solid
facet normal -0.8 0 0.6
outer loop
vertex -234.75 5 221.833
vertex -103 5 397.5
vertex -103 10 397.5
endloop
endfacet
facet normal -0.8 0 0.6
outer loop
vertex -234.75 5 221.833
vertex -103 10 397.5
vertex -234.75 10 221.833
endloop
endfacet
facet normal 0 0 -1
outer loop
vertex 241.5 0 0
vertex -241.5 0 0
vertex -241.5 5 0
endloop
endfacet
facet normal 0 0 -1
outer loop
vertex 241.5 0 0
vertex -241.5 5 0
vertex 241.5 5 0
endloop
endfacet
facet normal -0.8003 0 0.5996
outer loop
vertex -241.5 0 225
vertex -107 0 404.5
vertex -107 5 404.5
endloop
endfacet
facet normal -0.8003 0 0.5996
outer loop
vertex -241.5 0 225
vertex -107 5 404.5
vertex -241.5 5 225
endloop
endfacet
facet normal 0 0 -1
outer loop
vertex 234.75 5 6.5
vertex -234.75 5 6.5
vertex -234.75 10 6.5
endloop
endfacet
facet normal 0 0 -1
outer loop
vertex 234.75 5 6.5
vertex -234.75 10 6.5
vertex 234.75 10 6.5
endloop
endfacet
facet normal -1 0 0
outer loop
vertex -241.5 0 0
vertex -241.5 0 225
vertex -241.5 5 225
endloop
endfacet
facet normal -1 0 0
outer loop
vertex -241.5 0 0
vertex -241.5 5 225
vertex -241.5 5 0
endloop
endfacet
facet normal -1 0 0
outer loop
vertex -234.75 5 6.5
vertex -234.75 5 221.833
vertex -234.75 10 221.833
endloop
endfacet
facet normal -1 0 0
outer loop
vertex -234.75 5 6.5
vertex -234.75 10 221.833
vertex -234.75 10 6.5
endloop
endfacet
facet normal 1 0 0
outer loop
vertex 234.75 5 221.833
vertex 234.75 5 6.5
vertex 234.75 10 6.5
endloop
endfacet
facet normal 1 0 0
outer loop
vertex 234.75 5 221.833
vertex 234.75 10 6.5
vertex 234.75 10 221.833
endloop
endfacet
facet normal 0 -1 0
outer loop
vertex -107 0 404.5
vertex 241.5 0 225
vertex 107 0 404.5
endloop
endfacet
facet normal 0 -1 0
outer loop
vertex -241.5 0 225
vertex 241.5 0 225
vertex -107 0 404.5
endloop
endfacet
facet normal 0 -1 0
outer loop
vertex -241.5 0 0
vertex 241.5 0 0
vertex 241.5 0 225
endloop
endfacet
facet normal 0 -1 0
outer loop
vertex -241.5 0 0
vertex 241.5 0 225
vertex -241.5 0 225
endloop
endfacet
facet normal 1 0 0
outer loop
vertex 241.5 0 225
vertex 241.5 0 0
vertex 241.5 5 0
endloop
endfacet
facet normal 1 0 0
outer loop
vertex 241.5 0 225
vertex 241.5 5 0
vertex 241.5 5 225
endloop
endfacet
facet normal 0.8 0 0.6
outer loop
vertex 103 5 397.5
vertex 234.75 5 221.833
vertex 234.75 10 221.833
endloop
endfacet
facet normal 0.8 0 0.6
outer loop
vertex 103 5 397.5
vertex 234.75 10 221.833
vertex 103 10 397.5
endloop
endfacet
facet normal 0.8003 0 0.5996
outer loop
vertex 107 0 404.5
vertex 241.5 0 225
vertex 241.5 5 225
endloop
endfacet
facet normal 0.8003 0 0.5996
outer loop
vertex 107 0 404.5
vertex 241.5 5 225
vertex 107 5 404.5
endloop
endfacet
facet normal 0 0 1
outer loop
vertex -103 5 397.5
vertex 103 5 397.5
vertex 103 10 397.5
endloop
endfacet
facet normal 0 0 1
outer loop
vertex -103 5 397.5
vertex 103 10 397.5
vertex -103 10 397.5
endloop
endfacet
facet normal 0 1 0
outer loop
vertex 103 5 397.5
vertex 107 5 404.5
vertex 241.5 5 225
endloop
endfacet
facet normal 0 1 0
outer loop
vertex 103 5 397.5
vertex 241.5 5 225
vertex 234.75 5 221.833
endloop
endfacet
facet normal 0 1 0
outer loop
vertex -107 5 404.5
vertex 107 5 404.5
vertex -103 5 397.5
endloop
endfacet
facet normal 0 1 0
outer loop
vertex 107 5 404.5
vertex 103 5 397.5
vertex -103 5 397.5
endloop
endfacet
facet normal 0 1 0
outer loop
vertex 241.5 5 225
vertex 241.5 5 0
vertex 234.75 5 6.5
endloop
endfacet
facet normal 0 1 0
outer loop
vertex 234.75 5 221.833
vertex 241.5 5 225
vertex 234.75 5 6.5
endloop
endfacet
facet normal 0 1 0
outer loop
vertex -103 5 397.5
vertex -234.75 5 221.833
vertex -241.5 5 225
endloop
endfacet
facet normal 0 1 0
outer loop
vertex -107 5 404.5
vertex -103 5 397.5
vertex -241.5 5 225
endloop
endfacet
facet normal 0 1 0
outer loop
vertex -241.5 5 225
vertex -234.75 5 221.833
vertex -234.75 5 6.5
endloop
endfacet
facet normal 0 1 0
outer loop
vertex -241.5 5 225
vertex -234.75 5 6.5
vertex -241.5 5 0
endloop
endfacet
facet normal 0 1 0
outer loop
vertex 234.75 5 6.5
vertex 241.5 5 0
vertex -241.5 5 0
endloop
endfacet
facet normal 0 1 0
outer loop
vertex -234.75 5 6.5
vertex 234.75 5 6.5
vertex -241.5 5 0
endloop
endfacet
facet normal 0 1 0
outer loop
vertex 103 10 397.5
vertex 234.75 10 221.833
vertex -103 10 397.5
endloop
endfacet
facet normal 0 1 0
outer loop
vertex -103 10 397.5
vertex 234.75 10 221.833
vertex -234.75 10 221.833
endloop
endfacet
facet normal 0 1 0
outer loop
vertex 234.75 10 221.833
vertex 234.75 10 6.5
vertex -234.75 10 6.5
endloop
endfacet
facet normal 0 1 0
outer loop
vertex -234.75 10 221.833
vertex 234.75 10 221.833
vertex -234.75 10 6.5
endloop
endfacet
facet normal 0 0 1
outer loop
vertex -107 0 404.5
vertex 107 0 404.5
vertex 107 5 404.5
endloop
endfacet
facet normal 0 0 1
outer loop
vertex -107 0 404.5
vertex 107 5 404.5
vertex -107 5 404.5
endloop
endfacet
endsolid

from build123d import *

# Parameters (mm, degrees)
EXTRUDE_1_DEPTH = 5
EXTRUDE_2_DEPTH = 5


with BuildPart() as part:
    # 草图1 → 凸台-拉伸1 (new body)
    with BuildSketch(Plane(origin=(0, 0, 0), x_dir=(1, 0, 0), z_dir=(0, 1, 0))):
        Polygon((-241.5, 0), (241.5, 0), (241.5, -225), (107, -404.5), (-107, -404.5), (-241.5, -225), align=None)
    extrude(amount=EXTRUDE_1_DEPTH)

    # 草图2 → 凸台-拉伸2 (add)
    with BuildSketch(Plane(origin=(0, 5, 0), x_dir=(1, 0, 0), z_dir=(0, 1, 0))):
        Polygon((-234.75, -6.5), (234.75, -6.5), (234.75, -221.833333333), (103, -397.5), (-103, -397.5), (-234.75, -221.833333333), align=None)
    extrude(amount=EXTRUDE_2_DEPTH)


solid = part.part
